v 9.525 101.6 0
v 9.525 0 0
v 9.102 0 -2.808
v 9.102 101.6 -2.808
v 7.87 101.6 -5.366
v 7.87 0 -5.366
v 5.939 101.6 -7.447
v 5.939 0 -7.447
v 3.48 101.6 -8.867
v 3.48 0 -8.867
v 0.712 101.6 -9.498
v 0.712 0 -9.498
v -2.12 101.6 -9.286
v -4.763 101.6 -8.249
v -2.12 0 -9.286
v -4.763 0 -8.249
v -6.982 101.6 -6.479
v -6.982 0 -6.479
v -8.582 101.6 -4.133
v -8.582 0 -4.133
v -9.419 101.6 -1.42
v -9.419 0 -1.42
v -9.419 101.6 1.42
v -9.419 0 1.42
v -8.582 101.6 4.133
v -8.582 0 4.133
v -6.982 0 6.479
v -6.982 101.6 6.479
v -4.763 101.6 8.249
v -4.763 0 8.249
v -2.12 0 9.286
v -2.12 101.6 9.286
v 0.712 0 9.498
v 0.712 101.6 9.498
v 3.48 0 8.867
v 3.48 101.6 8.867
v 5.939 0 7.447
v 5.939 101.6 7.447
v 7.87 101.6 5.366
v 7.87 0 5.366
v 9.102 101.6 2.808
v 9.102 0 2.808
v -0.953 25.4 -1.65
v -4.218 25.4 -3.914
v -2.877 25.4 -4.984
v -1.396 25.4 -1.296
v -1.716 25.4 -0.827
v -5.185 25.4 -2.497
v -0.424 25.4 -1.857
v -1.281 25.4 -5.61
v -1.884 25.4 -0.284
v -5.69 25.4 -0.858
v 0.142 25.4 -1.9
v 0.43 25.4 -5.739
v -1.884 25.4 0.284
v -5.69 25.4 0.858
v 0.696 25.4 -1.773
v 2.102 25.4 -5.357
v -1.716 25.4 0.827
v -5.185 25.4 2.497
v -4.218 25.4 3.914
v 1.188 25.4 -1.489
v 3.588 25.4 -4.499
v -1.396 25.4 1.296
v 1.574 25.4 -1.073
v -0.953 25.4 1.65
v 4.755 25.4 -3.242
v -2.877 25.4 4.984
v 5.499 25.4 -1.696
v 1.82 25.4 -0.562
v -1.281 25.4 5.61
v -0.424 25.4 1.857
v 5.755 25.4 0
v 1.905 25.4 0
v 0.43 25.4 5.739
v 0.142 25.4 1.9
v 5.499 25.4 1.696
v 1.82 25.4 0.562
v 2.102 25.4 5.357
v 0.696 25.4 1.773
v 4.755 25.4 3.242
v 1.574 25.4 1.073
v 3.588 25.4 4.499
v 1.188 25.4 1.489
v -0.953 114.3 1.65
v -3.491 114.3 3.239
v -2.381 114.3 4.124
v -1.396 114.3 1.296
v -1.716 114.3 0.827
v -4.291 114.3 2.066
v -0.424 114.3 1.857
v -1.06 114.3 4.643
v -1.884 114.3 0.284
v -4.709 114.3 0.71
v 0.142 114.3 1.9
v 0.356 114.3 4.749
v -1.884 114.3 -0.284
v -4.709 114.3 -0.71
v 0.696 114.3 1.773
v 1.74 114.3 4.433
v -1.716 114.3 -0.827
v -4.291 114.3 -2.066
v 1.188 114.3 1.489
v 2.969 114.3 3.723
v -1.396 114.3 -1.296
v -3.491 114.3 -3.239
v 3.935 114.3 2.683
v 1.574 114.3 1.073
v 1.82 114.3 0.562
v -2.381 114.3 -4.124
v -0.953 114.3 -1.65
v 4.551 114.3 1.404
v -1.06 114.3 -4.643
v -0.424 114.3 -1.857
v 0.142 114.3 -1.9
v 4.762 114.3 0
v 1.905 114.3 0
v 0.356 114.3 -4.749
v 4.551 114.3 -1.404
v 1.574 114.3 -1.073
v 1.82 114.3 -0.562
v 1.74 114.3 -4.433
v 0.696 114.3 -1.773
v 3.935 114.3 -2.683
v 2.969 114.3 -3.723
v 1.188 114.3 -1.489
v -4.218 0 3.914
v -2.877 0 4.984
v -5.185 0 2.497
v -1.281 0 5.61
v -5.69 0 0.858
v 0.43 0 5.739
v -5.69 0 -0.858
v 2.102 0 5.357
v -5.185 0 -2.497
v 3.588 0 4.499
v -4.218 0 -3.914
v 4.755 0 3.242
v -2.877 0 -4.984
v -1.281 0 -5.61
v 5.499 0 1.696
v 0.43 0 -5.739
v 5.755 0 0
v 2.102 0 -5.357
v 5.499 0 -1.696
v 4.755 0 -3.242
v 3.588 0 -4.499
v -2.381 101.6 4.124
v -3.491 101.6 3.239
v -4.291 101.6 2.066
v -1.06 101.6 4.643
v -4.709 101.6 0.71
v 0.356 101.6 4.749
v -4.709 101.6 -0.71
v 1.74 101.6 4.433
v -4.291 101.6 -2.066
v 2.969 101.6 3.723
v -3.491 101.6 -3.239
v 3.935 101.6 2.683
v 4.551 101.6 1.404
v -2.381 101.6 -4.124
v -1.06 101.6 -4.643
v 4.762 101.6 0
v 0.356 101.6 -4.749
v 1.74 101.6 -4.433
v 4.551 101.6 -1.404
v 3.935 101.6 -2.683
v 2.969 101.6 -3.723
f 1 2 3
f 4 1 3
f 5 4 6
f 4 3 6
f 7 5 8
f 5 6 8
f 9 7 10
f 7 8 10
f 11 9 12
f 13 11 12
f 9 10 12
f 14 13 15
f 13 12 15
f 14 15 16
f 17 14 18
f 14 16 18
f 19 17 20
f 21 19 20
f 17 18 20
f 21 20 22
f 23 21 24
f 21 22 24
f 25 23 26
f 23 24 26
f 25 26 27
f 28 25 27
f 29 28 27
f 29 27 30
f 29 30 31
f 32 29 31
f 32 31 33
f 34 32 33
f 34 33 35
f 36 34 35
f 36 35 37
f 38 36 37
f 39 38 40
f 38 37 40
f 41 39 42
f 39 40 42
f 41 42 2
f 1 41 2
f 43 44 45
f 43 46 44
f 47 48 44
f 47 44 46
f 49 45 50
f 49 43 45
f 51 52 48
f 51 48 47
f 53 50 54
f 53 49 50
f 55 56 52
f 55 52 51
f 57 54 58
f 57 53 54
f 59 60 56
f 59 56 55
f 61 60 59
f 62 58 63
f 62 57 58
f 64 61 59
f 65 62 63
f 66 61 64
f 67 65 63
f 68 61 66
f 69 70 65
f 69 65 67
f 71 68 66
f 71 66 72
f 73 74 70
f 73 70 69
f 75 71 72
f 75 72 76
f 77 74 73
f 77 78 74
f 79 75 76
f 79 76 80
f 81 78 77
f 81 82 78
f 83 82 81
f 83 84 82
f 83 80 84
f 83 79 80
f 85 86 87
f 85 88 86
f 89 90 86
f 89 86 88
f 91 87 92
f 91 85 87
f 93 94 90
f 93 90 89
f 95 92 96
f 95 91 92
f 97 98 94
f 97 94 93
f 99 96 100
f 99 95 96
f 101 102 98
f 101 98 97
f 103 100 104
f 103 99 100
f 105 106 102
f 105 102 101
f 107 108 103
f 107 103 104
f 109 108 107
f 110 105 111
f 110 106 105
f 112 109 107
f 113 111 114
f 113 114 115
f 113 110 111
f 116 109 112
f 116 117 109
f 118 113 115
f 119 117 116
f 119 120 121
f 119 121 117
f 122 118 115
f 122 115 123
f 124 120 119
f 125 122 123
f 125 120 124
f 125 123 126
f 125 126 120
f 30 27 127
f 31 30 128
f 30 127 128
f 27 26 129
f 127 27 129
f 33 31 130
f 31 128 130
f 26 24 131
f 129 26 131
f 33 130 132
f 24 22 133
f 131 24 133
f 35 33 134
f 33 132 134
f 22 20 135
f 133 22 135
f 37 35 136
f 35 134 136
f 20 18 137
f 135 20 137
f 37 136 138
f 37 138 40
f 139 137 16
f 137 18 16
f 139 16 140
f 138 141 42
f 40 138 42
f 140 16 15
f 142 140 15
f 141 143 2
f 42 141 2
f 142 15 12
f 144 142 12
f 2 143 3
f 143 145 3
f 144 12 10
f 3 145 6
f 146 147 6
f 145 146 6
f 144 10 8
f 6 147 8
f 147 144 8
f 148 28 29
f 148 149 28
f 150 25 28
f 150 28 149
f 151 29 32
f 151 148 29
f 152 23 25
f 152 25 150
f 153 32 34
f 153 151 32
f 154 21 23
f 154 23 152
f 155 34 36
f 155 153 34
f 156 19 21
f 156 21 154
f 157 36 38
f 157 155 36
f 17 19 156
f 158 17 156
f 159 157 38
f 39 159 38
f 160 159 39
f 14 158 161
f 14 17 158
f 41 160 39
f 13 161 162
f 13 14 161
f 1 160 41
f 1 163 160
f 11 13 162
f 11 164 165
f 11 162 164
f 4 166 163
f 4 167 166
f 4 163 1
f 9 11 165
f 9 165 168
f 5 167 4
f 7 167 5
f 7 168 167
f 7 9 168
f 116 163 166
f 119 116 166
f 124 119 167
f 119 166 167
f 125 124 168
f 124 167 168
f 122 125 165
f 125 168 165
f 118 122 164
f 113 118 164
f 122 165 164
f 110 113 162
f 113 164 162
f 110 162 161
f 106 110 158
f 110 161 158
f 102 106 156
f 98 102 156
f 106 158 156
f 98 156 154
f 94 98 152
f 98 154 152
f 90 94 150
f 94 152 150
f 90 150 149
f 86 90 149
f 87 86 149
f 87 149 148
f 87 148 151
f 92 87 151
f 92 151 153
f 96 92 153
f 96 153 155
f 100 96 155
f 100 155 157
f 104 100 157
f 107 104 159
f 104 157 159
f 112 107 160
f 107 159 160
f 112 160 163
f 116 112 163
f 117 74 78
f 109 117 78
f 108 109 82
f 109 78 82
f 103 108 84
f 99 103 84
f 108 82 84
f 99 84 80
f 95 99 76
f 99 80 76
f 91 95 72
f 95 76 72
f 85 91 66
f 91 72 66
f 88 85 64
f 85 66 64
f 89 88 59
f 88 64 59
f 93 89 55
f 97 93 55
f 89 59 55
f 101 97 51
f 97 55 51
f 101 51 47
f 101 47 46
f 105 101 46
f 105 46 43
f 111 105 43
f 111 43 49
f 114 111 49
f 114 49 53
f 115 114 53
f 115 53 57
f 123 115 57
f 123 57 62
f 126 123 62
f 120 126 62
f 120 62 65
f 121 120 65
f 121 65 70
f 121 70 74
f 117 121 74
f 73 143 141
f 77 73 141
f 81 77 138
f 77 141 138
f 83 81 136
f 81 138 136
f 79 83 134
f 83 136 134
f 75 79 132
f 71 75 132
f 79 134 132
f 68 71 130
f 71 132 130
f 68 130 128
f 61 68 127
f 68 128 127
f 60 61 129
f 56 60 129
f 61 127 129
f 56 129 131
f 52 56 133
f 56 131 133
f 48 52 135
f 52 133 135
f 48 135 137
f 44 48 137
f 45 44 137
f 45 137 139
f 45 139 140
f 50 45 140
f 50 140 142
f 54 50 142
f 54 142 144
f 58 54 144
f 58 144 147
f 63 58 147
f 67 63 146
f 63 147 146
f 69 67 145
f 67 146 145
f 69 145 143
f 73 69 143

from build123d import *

# Parameters (mm, degrees)
SKETCH1_R           = 9.525
BOSS_EXTRUDE2_DEPTH = 101.6
SKETCH3_R           = 4.7625
BOSS_EXTRUDE3_DEPTH = 12.7
SKETCH14_R          = 5.7546875
CUT_EXTRUDE4_DEPTH  = 25.4
SKETCH17_R          = 1.905
CUT_EXTRUDE5_DEPTH  = 89.9


with BuildPart() as part:
    # Sketch1 → Boss-Extrude2 (new body)
    with BuildSketch(Plane(origin=(0, 0, 0), x_dir=(1, 0, 0), z_dir=(0, 1, 0))):
        Circle(SKETCH1_R)
    extrude(amount=BOSS_EXTRUDE2_DEPTH)

    # Sketch3 → Boss-Extrude3 (add)
    with BuildSketch(Plane(origin=(0, 101.6, 0), x_dir=(1, 0, 0), z_dir=(0, 1, 0))):
        Circle(SKETCH3_R)
    extrude(amount=BOSS_EXTRUDE3_DEPTH)

    # Sketch14 → Cut-Extrude4 (cut)
    with BuildSketch(Plane.XZ):
        Circle(SKETCH14_R)
    extrude(amount=-CUT_EXTRUDE4_DEPTH, mode=Mode.SUBTRACT)

    # Sketch17 → Cut-Extrude5 (cut, through all)
    with BuildSketch(Plane.XZ.offset(-25.4)):
        Circle(SKETCH17_R)
    extrude(amount=-CUT_EXTRUDE5_DEPTH, mode=Mode.SUBTRACT)


solid = part.part
